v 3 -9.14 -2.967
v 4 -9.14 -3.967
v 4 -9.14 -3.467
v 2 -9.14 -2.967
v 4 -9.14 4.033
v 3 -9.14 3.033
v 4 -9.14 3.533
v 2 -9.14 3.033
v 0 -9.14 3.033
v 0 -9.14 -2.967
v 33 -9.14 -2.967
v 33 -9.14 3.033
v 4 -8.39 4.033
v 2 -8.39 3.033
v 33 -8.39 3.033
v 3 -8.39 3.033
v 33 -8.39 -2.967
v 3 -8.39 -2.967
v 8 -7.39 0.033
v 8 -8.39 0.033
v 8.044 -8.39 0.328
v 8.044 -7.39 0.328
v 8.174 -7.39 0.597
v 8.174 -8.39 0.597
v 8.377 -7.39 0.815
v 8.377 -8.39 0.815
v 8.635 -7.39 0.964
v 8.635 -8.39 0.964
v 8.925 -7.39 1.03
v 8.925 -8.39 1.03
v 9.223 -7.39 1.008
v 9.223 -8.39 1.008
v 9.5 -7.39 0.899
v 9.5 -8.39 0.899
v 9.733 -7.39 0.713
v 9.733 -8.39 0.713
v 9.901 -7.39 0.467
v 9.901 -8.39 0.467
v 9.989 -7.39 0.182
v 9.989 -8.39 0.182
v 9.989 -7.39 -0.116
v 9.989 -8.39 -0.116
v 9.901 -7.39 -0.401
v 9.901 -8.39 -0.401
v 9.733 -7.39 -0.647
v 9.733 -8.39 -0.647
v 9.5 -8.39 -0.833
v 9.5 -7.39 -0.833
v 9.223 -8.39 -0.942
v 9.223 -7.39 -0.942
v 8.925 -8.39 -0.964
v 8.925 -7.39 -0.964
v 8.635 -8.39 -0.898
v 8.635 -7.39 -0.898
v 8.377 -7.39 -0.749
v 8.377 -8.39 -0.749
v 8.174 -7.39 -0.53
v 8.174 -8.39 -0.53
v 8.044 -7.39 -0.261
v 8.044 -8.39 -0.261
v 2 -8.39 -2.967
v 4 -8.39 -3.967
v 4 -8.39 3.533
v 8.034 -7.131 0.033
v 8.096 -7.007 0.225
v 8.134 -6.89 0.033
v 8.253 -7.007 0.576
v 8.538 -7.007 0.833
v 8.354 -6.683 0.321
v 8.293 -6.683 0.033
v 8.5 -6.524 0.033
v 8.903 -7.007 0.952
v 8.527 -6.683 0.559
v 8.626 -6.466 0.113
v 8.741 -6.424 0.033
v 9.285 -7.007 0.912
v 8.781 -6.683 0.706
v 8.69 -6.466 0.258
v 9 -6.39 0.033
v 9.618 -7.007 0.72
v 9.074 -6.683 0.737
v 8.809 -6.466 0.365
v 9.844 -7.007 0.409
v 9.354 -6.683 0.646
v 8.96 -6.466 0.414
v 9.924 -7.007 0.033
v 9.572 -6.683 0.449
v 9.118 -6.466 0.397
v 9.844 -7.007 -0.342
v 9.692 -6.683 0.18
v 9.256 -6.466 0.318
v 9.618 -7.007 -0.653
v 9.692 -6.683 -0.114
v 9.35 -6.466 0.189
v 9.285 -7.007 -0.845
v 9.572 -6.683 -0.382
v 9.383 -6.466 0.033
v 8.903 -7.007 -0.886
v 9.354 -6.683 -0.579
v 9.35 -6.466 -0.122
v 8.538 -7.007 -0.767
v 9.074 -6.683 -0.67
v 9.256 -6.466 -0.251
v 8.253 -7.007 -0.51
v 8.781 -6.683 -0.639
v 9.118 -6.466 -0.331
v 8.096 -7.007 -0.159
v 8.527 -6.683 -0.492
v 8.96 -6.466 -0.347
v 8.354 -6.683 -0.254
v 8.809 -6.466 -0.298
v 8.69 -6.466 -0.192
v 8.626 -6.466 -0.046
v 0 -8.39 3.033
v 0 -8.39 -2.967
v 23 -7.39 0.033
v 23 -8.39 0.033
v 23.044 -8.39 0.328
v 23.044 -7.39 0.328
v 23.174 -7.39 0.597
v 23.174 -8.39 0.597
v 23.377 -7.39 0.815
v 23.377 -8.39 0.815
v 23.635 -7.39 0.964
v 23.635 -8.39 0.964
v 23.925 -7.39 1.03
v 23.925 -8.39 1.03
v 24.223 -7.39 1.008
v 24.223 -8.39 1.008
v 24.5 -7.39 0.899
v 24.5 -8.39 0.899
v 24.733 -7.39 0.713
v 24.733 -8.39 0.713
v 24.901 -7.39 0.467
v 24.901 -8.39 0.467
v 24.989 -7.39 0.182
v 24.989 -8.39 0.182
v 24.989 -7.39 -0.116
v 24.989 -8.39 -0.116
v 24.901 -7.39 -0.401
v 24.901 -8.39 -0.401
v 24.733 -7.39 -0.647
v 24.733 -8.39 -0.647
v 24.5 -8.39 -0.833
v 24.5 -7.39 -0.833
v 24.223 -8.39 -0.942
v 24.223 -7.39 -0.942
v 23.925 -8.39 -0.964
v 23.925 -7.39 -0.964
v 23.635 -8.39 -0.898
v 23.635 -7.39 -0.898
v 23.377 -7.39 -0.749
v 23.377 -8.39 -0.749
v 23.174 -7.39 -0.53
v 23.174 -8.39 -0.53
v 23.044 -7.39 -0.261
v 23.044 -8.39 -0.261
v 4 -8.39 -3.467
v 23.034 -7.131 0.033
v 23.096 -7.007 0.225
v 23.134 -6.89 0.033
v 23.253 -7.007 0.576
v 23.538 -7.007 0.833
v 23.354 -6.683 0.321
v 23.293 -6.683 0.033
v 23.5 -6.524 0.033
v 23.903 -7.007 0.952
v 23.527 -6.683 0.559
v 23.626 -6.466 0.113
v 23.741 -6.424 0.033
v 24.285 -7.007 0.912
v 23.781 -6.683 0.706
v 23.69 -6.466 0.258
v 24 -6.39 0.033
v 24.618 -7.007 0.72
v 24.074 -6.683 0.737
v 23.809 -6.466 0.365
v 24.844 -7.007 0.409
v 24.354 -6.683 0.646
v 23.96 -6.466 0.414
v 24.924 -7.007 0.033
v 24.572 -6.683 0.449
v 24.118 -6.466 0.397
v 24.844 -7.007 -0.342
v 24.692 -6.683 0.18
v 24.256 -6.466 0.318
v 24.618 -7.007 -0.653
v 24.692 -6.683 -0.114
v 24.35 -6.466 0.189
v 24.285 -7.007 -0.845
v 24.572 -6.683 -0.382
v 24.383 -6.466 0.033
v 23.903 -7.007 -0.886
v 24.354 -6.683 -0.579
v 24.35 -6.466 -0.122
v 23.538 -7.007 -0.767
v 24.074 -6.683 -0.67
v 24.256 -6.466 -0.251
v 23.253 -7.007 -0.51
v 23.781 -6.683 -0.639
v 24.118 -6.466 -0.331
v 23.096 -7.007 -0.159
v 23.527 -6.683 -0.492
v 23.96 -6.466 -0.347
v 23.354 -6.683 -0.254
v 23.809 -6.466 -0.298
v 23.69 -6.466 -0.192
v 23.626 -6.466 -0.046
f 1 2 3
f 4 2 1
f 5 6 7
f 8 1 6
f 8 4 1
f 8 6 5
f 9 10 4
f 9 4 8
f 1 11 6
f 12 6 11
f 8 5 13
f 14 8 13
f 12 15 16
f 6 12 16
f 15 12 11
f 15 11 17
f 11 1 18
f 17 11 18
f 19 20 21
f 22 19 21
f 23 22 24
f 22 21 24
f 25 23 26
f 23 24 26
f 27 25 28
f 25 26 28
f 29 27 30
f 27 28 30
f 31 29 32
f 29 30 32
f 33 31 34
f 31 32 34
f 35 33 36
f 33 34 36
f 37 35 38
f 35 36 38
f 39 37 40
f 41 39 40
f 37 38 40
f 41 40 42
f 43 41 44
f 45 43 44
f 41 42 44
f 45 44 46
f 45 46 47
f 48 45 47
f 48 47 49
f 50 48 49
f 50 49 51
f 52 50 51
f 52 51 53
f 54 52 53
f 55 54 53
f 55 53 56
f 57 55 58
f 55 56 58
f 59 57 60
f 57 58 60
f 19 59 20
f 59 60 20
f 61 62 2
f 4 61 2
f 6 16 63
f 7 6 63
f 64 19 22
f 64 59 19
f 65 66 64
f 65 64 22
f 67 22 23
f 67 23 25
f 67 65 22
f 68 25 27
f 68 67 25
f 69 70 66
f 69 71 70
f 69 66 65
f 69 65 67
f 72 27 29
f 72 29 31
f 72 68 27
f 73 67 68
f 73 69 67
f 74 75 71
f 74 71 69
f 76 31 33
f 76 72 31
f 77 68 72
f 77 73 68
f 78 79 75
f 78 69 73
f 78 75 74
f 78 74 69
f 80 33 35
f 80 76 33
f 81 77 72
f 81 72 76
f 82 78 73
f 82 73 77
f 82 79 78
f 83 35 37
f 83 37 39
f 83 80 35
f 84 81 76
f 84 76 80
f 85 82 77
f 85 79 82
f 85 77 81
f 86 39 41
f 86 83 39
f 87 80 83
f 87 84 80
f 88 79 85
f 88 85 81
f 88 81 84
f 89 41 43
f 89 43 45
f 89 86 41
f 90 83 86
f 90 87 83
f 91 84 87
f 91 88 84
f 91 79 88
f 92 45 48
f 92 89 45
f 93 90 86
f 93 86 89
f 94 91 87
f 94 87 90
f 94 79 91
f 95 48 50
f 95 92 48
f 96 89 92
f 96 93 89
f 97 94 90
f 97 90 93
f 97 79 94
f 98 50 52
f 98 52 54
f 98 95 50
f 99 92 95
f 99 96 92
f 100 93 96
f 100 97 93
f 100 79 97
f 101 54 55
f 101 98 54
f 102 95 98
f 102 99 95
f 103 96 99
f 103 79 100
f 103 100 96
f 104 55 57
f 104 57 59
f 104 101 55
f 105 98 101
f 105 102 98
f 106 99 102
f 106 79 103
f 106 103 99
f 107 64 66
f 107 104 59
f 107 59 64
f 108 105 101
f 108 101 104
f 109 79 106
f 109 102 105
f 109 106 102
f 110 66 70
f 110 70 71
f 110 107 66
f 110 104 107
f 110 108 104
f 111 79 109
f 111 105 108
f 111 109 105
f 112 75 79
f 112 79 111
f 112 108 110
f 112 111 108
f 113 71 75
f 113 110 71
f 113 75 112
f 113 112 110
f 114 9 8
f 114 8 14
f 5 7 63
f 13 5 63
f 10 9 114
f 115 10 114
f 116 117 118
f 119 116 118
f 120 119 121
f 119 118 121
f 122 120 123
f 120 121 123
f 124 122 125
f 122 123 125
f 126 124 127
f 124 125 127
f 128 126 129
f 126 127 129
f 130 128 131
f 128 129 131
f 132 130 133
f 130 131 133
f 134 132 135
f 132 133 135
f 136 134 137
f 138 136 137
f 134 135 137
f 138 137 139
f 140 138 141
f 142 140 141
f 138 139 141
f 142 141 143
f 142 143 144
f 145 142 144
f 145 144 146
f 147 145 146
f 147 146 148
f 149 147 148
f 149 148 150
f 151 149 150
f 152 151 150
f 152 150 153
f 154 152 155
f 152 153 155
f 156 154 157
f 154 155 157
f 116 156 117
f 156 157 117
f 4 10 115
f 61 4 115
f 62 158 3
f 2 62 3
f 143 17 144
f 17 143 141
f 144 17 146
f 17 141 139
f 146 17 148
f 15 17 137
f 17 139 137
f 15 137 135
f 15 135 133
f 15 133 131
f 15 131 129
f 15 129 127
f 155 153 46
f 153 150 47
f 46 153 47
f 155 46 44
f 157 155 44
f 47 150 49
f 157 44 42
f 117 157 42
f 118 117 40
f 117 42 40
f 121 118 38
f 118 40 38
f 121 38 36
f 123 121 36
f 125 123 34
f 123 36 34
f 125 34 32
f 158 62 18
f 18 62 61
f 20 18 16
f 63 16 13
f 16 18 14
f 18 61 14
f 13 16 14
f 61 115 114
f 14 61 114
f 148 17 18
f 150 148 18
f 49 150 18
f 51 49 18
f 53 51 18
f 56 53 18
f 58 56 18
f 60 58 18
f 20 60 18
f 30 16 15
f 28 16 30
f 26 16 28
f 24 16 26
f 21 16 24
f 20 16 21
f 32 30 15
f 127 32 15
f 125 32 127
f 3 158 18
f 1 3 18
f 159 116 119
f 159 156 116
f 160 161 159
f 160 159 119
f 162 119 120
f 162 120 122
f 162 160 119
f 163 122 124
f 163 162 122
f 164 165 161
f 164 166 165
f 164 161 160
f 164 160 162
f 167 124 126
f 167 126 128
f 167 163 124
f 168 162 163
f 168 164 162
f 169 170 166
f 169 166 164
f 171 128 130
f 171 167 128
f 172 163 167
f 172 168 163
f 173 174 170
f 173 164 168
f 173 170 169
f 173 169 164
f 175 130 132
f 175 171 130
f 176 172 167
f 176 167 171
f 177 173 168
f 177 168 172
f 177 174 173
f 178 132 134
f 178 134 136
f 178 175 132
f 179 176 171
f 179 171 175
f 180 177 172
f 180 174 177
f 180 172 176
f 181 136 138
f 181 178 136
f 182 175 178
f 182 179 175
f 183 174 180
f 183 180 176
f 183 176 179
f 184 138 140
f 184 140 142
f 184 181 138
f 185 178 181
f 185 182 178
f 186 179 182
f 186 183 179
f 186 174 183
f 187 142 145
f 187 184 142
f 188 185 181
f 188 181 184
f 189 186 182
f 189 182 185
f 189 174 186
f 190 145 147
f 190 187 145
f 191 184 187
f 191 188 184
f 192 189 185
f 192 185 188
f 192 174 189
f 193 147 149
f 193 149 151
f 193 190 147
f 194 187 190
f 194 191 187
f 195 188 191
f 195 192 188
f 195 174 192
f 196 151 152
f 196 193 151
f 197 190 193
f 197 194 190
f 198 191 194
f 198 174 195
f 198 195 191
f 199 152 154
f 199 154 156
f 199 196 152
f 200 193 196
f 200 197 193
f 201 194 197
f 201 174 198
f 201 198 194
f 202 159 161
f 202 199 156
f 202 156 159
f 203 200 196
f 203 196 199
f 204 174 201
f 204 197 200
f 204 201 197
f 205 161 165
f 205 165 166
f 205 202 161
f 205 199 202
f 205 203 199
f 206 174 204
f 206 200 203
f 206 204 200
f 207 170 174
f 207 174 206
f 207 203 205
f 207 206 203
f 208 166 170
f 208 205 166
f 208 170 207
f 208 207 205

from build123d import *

# Parameters (mm, degrees)
F0_W      = 0.75
F0_H      = 6
F1_DEPTH  = 33
F2_R      = 1
F3_DEPTH  = 2
F4_R      = 1
F5_W      = 2
F5_H      = 0.75
F6_DEPTH  = 1
F7_SIZE2  = 1.99999
F7_SIZE   = 0.99999
F8_W      = 2
F8_H      = 0.75
F9_DEPTH  = 1
F10_SIZE2 = 1.99999
F10_SIZE  = 0.99999
F12_DEPTH = 25


# Not quite as in the source:
# - a fillet or chamfer is up to 0.001 mm smaller than in the source, because OpenCascade refuses the exact size


with BuildPart() as f1:
    # F0 (on Right) → F1 (new body)
    with BuildSketch(Plane.YZ):
        with Locations((-8.76496256, 0.0332817435)):
            Rectangle(F0_W, F0_H)
    extrude(amount=F1_DEPTH)

    # F2 (on face) → F3 (join)
    with BuildSketch(Plane(origin=(0, -8.38996256, 0), x_dir=(-1, 0, 0), z_dir=(0, 1, 0))):
        with Locations((-9, 0.0332817435)):
            Circle(F2_R)
        with Locations((-24, 0.0332817435)):
            Circle(F2_R)
    extrude(amount=F3_DEPTH)

    # F4
    f4_edges = [f1.edges().sort_by_distance(p)[0] for p in [
        (10, -6.389963, 0.033282),
        (25, -6.389963, 0.033282),
    ]]
    fillet(f4_edges, radius=F4_R)

    # F5 (on face) → F6 (join)
    with BuildSketch(Plane.XY.offset(3.0332817435)):
        with Locations((3, -8.76496256)):
            Rectangle(F5_W, F5_H)
    extrude(amount=F6_DEPTH)

    # F7 (size 1 and 2 in the source; OpenCascade refuses exactly that, so slightly less here)
    f7_edges = [f1.edges().sort_by_distance(p)[0] for p in [
        (2, -8.764963, 4.033282),
    ]]
    f7_side = f1.faces().sort_by_distance((2, -8.764963, 3.533282))[0]
    chamfer(f7_edges, length=F7_SIZE, length2=F7_SIZE2, reference=f7_side)

    # F8 (on face) → F9 (join)
    with BuildSketch(Plane(origin=(0, 0, -2.9667182565), x_dir=(1, 0, 0), z_dir=(0, 0, -1))):
        with Locations((3, 8.76496256)):
            Rectangle(F8_W, F8_H)
    extrude(amount=F9_DEPTH)

    # F10 (size 1 and 2 in the source; OpenCascade refuses exactly that, so slightly less here)
    f10_edges = [f1.edges().sort_by_distance(p)[0] for p in [
        (2, -8.764963, -3.966718),
    ]]
    f10_side = f1.faces().sort_by_distance((2, -8.764963, -3.466718))[0]
    chamfer(f10_edges, length=F10_SIZE, length2=F10_SIZE2, reference=f10_side)

    # F11 (on face) → F12 (cut)
    with BuildSketch(Plane(origin=(0, -8.38996256, 0), x_dir=(-1, 0, 0), z_dir=(0, 1, 0))):
        Polygon((-3, 3.0332817435), (-4, 3.5332817435), (-4, 3.0332817435), align=None)
        Polygon((-3, -2.9667182565), (-4, -2.9667182565), (-4, -3.4667182565), align=None)
    extrude(amount=-F12_DEPTH, mode=Mode.SUBTRACT)


solid = f1.part
